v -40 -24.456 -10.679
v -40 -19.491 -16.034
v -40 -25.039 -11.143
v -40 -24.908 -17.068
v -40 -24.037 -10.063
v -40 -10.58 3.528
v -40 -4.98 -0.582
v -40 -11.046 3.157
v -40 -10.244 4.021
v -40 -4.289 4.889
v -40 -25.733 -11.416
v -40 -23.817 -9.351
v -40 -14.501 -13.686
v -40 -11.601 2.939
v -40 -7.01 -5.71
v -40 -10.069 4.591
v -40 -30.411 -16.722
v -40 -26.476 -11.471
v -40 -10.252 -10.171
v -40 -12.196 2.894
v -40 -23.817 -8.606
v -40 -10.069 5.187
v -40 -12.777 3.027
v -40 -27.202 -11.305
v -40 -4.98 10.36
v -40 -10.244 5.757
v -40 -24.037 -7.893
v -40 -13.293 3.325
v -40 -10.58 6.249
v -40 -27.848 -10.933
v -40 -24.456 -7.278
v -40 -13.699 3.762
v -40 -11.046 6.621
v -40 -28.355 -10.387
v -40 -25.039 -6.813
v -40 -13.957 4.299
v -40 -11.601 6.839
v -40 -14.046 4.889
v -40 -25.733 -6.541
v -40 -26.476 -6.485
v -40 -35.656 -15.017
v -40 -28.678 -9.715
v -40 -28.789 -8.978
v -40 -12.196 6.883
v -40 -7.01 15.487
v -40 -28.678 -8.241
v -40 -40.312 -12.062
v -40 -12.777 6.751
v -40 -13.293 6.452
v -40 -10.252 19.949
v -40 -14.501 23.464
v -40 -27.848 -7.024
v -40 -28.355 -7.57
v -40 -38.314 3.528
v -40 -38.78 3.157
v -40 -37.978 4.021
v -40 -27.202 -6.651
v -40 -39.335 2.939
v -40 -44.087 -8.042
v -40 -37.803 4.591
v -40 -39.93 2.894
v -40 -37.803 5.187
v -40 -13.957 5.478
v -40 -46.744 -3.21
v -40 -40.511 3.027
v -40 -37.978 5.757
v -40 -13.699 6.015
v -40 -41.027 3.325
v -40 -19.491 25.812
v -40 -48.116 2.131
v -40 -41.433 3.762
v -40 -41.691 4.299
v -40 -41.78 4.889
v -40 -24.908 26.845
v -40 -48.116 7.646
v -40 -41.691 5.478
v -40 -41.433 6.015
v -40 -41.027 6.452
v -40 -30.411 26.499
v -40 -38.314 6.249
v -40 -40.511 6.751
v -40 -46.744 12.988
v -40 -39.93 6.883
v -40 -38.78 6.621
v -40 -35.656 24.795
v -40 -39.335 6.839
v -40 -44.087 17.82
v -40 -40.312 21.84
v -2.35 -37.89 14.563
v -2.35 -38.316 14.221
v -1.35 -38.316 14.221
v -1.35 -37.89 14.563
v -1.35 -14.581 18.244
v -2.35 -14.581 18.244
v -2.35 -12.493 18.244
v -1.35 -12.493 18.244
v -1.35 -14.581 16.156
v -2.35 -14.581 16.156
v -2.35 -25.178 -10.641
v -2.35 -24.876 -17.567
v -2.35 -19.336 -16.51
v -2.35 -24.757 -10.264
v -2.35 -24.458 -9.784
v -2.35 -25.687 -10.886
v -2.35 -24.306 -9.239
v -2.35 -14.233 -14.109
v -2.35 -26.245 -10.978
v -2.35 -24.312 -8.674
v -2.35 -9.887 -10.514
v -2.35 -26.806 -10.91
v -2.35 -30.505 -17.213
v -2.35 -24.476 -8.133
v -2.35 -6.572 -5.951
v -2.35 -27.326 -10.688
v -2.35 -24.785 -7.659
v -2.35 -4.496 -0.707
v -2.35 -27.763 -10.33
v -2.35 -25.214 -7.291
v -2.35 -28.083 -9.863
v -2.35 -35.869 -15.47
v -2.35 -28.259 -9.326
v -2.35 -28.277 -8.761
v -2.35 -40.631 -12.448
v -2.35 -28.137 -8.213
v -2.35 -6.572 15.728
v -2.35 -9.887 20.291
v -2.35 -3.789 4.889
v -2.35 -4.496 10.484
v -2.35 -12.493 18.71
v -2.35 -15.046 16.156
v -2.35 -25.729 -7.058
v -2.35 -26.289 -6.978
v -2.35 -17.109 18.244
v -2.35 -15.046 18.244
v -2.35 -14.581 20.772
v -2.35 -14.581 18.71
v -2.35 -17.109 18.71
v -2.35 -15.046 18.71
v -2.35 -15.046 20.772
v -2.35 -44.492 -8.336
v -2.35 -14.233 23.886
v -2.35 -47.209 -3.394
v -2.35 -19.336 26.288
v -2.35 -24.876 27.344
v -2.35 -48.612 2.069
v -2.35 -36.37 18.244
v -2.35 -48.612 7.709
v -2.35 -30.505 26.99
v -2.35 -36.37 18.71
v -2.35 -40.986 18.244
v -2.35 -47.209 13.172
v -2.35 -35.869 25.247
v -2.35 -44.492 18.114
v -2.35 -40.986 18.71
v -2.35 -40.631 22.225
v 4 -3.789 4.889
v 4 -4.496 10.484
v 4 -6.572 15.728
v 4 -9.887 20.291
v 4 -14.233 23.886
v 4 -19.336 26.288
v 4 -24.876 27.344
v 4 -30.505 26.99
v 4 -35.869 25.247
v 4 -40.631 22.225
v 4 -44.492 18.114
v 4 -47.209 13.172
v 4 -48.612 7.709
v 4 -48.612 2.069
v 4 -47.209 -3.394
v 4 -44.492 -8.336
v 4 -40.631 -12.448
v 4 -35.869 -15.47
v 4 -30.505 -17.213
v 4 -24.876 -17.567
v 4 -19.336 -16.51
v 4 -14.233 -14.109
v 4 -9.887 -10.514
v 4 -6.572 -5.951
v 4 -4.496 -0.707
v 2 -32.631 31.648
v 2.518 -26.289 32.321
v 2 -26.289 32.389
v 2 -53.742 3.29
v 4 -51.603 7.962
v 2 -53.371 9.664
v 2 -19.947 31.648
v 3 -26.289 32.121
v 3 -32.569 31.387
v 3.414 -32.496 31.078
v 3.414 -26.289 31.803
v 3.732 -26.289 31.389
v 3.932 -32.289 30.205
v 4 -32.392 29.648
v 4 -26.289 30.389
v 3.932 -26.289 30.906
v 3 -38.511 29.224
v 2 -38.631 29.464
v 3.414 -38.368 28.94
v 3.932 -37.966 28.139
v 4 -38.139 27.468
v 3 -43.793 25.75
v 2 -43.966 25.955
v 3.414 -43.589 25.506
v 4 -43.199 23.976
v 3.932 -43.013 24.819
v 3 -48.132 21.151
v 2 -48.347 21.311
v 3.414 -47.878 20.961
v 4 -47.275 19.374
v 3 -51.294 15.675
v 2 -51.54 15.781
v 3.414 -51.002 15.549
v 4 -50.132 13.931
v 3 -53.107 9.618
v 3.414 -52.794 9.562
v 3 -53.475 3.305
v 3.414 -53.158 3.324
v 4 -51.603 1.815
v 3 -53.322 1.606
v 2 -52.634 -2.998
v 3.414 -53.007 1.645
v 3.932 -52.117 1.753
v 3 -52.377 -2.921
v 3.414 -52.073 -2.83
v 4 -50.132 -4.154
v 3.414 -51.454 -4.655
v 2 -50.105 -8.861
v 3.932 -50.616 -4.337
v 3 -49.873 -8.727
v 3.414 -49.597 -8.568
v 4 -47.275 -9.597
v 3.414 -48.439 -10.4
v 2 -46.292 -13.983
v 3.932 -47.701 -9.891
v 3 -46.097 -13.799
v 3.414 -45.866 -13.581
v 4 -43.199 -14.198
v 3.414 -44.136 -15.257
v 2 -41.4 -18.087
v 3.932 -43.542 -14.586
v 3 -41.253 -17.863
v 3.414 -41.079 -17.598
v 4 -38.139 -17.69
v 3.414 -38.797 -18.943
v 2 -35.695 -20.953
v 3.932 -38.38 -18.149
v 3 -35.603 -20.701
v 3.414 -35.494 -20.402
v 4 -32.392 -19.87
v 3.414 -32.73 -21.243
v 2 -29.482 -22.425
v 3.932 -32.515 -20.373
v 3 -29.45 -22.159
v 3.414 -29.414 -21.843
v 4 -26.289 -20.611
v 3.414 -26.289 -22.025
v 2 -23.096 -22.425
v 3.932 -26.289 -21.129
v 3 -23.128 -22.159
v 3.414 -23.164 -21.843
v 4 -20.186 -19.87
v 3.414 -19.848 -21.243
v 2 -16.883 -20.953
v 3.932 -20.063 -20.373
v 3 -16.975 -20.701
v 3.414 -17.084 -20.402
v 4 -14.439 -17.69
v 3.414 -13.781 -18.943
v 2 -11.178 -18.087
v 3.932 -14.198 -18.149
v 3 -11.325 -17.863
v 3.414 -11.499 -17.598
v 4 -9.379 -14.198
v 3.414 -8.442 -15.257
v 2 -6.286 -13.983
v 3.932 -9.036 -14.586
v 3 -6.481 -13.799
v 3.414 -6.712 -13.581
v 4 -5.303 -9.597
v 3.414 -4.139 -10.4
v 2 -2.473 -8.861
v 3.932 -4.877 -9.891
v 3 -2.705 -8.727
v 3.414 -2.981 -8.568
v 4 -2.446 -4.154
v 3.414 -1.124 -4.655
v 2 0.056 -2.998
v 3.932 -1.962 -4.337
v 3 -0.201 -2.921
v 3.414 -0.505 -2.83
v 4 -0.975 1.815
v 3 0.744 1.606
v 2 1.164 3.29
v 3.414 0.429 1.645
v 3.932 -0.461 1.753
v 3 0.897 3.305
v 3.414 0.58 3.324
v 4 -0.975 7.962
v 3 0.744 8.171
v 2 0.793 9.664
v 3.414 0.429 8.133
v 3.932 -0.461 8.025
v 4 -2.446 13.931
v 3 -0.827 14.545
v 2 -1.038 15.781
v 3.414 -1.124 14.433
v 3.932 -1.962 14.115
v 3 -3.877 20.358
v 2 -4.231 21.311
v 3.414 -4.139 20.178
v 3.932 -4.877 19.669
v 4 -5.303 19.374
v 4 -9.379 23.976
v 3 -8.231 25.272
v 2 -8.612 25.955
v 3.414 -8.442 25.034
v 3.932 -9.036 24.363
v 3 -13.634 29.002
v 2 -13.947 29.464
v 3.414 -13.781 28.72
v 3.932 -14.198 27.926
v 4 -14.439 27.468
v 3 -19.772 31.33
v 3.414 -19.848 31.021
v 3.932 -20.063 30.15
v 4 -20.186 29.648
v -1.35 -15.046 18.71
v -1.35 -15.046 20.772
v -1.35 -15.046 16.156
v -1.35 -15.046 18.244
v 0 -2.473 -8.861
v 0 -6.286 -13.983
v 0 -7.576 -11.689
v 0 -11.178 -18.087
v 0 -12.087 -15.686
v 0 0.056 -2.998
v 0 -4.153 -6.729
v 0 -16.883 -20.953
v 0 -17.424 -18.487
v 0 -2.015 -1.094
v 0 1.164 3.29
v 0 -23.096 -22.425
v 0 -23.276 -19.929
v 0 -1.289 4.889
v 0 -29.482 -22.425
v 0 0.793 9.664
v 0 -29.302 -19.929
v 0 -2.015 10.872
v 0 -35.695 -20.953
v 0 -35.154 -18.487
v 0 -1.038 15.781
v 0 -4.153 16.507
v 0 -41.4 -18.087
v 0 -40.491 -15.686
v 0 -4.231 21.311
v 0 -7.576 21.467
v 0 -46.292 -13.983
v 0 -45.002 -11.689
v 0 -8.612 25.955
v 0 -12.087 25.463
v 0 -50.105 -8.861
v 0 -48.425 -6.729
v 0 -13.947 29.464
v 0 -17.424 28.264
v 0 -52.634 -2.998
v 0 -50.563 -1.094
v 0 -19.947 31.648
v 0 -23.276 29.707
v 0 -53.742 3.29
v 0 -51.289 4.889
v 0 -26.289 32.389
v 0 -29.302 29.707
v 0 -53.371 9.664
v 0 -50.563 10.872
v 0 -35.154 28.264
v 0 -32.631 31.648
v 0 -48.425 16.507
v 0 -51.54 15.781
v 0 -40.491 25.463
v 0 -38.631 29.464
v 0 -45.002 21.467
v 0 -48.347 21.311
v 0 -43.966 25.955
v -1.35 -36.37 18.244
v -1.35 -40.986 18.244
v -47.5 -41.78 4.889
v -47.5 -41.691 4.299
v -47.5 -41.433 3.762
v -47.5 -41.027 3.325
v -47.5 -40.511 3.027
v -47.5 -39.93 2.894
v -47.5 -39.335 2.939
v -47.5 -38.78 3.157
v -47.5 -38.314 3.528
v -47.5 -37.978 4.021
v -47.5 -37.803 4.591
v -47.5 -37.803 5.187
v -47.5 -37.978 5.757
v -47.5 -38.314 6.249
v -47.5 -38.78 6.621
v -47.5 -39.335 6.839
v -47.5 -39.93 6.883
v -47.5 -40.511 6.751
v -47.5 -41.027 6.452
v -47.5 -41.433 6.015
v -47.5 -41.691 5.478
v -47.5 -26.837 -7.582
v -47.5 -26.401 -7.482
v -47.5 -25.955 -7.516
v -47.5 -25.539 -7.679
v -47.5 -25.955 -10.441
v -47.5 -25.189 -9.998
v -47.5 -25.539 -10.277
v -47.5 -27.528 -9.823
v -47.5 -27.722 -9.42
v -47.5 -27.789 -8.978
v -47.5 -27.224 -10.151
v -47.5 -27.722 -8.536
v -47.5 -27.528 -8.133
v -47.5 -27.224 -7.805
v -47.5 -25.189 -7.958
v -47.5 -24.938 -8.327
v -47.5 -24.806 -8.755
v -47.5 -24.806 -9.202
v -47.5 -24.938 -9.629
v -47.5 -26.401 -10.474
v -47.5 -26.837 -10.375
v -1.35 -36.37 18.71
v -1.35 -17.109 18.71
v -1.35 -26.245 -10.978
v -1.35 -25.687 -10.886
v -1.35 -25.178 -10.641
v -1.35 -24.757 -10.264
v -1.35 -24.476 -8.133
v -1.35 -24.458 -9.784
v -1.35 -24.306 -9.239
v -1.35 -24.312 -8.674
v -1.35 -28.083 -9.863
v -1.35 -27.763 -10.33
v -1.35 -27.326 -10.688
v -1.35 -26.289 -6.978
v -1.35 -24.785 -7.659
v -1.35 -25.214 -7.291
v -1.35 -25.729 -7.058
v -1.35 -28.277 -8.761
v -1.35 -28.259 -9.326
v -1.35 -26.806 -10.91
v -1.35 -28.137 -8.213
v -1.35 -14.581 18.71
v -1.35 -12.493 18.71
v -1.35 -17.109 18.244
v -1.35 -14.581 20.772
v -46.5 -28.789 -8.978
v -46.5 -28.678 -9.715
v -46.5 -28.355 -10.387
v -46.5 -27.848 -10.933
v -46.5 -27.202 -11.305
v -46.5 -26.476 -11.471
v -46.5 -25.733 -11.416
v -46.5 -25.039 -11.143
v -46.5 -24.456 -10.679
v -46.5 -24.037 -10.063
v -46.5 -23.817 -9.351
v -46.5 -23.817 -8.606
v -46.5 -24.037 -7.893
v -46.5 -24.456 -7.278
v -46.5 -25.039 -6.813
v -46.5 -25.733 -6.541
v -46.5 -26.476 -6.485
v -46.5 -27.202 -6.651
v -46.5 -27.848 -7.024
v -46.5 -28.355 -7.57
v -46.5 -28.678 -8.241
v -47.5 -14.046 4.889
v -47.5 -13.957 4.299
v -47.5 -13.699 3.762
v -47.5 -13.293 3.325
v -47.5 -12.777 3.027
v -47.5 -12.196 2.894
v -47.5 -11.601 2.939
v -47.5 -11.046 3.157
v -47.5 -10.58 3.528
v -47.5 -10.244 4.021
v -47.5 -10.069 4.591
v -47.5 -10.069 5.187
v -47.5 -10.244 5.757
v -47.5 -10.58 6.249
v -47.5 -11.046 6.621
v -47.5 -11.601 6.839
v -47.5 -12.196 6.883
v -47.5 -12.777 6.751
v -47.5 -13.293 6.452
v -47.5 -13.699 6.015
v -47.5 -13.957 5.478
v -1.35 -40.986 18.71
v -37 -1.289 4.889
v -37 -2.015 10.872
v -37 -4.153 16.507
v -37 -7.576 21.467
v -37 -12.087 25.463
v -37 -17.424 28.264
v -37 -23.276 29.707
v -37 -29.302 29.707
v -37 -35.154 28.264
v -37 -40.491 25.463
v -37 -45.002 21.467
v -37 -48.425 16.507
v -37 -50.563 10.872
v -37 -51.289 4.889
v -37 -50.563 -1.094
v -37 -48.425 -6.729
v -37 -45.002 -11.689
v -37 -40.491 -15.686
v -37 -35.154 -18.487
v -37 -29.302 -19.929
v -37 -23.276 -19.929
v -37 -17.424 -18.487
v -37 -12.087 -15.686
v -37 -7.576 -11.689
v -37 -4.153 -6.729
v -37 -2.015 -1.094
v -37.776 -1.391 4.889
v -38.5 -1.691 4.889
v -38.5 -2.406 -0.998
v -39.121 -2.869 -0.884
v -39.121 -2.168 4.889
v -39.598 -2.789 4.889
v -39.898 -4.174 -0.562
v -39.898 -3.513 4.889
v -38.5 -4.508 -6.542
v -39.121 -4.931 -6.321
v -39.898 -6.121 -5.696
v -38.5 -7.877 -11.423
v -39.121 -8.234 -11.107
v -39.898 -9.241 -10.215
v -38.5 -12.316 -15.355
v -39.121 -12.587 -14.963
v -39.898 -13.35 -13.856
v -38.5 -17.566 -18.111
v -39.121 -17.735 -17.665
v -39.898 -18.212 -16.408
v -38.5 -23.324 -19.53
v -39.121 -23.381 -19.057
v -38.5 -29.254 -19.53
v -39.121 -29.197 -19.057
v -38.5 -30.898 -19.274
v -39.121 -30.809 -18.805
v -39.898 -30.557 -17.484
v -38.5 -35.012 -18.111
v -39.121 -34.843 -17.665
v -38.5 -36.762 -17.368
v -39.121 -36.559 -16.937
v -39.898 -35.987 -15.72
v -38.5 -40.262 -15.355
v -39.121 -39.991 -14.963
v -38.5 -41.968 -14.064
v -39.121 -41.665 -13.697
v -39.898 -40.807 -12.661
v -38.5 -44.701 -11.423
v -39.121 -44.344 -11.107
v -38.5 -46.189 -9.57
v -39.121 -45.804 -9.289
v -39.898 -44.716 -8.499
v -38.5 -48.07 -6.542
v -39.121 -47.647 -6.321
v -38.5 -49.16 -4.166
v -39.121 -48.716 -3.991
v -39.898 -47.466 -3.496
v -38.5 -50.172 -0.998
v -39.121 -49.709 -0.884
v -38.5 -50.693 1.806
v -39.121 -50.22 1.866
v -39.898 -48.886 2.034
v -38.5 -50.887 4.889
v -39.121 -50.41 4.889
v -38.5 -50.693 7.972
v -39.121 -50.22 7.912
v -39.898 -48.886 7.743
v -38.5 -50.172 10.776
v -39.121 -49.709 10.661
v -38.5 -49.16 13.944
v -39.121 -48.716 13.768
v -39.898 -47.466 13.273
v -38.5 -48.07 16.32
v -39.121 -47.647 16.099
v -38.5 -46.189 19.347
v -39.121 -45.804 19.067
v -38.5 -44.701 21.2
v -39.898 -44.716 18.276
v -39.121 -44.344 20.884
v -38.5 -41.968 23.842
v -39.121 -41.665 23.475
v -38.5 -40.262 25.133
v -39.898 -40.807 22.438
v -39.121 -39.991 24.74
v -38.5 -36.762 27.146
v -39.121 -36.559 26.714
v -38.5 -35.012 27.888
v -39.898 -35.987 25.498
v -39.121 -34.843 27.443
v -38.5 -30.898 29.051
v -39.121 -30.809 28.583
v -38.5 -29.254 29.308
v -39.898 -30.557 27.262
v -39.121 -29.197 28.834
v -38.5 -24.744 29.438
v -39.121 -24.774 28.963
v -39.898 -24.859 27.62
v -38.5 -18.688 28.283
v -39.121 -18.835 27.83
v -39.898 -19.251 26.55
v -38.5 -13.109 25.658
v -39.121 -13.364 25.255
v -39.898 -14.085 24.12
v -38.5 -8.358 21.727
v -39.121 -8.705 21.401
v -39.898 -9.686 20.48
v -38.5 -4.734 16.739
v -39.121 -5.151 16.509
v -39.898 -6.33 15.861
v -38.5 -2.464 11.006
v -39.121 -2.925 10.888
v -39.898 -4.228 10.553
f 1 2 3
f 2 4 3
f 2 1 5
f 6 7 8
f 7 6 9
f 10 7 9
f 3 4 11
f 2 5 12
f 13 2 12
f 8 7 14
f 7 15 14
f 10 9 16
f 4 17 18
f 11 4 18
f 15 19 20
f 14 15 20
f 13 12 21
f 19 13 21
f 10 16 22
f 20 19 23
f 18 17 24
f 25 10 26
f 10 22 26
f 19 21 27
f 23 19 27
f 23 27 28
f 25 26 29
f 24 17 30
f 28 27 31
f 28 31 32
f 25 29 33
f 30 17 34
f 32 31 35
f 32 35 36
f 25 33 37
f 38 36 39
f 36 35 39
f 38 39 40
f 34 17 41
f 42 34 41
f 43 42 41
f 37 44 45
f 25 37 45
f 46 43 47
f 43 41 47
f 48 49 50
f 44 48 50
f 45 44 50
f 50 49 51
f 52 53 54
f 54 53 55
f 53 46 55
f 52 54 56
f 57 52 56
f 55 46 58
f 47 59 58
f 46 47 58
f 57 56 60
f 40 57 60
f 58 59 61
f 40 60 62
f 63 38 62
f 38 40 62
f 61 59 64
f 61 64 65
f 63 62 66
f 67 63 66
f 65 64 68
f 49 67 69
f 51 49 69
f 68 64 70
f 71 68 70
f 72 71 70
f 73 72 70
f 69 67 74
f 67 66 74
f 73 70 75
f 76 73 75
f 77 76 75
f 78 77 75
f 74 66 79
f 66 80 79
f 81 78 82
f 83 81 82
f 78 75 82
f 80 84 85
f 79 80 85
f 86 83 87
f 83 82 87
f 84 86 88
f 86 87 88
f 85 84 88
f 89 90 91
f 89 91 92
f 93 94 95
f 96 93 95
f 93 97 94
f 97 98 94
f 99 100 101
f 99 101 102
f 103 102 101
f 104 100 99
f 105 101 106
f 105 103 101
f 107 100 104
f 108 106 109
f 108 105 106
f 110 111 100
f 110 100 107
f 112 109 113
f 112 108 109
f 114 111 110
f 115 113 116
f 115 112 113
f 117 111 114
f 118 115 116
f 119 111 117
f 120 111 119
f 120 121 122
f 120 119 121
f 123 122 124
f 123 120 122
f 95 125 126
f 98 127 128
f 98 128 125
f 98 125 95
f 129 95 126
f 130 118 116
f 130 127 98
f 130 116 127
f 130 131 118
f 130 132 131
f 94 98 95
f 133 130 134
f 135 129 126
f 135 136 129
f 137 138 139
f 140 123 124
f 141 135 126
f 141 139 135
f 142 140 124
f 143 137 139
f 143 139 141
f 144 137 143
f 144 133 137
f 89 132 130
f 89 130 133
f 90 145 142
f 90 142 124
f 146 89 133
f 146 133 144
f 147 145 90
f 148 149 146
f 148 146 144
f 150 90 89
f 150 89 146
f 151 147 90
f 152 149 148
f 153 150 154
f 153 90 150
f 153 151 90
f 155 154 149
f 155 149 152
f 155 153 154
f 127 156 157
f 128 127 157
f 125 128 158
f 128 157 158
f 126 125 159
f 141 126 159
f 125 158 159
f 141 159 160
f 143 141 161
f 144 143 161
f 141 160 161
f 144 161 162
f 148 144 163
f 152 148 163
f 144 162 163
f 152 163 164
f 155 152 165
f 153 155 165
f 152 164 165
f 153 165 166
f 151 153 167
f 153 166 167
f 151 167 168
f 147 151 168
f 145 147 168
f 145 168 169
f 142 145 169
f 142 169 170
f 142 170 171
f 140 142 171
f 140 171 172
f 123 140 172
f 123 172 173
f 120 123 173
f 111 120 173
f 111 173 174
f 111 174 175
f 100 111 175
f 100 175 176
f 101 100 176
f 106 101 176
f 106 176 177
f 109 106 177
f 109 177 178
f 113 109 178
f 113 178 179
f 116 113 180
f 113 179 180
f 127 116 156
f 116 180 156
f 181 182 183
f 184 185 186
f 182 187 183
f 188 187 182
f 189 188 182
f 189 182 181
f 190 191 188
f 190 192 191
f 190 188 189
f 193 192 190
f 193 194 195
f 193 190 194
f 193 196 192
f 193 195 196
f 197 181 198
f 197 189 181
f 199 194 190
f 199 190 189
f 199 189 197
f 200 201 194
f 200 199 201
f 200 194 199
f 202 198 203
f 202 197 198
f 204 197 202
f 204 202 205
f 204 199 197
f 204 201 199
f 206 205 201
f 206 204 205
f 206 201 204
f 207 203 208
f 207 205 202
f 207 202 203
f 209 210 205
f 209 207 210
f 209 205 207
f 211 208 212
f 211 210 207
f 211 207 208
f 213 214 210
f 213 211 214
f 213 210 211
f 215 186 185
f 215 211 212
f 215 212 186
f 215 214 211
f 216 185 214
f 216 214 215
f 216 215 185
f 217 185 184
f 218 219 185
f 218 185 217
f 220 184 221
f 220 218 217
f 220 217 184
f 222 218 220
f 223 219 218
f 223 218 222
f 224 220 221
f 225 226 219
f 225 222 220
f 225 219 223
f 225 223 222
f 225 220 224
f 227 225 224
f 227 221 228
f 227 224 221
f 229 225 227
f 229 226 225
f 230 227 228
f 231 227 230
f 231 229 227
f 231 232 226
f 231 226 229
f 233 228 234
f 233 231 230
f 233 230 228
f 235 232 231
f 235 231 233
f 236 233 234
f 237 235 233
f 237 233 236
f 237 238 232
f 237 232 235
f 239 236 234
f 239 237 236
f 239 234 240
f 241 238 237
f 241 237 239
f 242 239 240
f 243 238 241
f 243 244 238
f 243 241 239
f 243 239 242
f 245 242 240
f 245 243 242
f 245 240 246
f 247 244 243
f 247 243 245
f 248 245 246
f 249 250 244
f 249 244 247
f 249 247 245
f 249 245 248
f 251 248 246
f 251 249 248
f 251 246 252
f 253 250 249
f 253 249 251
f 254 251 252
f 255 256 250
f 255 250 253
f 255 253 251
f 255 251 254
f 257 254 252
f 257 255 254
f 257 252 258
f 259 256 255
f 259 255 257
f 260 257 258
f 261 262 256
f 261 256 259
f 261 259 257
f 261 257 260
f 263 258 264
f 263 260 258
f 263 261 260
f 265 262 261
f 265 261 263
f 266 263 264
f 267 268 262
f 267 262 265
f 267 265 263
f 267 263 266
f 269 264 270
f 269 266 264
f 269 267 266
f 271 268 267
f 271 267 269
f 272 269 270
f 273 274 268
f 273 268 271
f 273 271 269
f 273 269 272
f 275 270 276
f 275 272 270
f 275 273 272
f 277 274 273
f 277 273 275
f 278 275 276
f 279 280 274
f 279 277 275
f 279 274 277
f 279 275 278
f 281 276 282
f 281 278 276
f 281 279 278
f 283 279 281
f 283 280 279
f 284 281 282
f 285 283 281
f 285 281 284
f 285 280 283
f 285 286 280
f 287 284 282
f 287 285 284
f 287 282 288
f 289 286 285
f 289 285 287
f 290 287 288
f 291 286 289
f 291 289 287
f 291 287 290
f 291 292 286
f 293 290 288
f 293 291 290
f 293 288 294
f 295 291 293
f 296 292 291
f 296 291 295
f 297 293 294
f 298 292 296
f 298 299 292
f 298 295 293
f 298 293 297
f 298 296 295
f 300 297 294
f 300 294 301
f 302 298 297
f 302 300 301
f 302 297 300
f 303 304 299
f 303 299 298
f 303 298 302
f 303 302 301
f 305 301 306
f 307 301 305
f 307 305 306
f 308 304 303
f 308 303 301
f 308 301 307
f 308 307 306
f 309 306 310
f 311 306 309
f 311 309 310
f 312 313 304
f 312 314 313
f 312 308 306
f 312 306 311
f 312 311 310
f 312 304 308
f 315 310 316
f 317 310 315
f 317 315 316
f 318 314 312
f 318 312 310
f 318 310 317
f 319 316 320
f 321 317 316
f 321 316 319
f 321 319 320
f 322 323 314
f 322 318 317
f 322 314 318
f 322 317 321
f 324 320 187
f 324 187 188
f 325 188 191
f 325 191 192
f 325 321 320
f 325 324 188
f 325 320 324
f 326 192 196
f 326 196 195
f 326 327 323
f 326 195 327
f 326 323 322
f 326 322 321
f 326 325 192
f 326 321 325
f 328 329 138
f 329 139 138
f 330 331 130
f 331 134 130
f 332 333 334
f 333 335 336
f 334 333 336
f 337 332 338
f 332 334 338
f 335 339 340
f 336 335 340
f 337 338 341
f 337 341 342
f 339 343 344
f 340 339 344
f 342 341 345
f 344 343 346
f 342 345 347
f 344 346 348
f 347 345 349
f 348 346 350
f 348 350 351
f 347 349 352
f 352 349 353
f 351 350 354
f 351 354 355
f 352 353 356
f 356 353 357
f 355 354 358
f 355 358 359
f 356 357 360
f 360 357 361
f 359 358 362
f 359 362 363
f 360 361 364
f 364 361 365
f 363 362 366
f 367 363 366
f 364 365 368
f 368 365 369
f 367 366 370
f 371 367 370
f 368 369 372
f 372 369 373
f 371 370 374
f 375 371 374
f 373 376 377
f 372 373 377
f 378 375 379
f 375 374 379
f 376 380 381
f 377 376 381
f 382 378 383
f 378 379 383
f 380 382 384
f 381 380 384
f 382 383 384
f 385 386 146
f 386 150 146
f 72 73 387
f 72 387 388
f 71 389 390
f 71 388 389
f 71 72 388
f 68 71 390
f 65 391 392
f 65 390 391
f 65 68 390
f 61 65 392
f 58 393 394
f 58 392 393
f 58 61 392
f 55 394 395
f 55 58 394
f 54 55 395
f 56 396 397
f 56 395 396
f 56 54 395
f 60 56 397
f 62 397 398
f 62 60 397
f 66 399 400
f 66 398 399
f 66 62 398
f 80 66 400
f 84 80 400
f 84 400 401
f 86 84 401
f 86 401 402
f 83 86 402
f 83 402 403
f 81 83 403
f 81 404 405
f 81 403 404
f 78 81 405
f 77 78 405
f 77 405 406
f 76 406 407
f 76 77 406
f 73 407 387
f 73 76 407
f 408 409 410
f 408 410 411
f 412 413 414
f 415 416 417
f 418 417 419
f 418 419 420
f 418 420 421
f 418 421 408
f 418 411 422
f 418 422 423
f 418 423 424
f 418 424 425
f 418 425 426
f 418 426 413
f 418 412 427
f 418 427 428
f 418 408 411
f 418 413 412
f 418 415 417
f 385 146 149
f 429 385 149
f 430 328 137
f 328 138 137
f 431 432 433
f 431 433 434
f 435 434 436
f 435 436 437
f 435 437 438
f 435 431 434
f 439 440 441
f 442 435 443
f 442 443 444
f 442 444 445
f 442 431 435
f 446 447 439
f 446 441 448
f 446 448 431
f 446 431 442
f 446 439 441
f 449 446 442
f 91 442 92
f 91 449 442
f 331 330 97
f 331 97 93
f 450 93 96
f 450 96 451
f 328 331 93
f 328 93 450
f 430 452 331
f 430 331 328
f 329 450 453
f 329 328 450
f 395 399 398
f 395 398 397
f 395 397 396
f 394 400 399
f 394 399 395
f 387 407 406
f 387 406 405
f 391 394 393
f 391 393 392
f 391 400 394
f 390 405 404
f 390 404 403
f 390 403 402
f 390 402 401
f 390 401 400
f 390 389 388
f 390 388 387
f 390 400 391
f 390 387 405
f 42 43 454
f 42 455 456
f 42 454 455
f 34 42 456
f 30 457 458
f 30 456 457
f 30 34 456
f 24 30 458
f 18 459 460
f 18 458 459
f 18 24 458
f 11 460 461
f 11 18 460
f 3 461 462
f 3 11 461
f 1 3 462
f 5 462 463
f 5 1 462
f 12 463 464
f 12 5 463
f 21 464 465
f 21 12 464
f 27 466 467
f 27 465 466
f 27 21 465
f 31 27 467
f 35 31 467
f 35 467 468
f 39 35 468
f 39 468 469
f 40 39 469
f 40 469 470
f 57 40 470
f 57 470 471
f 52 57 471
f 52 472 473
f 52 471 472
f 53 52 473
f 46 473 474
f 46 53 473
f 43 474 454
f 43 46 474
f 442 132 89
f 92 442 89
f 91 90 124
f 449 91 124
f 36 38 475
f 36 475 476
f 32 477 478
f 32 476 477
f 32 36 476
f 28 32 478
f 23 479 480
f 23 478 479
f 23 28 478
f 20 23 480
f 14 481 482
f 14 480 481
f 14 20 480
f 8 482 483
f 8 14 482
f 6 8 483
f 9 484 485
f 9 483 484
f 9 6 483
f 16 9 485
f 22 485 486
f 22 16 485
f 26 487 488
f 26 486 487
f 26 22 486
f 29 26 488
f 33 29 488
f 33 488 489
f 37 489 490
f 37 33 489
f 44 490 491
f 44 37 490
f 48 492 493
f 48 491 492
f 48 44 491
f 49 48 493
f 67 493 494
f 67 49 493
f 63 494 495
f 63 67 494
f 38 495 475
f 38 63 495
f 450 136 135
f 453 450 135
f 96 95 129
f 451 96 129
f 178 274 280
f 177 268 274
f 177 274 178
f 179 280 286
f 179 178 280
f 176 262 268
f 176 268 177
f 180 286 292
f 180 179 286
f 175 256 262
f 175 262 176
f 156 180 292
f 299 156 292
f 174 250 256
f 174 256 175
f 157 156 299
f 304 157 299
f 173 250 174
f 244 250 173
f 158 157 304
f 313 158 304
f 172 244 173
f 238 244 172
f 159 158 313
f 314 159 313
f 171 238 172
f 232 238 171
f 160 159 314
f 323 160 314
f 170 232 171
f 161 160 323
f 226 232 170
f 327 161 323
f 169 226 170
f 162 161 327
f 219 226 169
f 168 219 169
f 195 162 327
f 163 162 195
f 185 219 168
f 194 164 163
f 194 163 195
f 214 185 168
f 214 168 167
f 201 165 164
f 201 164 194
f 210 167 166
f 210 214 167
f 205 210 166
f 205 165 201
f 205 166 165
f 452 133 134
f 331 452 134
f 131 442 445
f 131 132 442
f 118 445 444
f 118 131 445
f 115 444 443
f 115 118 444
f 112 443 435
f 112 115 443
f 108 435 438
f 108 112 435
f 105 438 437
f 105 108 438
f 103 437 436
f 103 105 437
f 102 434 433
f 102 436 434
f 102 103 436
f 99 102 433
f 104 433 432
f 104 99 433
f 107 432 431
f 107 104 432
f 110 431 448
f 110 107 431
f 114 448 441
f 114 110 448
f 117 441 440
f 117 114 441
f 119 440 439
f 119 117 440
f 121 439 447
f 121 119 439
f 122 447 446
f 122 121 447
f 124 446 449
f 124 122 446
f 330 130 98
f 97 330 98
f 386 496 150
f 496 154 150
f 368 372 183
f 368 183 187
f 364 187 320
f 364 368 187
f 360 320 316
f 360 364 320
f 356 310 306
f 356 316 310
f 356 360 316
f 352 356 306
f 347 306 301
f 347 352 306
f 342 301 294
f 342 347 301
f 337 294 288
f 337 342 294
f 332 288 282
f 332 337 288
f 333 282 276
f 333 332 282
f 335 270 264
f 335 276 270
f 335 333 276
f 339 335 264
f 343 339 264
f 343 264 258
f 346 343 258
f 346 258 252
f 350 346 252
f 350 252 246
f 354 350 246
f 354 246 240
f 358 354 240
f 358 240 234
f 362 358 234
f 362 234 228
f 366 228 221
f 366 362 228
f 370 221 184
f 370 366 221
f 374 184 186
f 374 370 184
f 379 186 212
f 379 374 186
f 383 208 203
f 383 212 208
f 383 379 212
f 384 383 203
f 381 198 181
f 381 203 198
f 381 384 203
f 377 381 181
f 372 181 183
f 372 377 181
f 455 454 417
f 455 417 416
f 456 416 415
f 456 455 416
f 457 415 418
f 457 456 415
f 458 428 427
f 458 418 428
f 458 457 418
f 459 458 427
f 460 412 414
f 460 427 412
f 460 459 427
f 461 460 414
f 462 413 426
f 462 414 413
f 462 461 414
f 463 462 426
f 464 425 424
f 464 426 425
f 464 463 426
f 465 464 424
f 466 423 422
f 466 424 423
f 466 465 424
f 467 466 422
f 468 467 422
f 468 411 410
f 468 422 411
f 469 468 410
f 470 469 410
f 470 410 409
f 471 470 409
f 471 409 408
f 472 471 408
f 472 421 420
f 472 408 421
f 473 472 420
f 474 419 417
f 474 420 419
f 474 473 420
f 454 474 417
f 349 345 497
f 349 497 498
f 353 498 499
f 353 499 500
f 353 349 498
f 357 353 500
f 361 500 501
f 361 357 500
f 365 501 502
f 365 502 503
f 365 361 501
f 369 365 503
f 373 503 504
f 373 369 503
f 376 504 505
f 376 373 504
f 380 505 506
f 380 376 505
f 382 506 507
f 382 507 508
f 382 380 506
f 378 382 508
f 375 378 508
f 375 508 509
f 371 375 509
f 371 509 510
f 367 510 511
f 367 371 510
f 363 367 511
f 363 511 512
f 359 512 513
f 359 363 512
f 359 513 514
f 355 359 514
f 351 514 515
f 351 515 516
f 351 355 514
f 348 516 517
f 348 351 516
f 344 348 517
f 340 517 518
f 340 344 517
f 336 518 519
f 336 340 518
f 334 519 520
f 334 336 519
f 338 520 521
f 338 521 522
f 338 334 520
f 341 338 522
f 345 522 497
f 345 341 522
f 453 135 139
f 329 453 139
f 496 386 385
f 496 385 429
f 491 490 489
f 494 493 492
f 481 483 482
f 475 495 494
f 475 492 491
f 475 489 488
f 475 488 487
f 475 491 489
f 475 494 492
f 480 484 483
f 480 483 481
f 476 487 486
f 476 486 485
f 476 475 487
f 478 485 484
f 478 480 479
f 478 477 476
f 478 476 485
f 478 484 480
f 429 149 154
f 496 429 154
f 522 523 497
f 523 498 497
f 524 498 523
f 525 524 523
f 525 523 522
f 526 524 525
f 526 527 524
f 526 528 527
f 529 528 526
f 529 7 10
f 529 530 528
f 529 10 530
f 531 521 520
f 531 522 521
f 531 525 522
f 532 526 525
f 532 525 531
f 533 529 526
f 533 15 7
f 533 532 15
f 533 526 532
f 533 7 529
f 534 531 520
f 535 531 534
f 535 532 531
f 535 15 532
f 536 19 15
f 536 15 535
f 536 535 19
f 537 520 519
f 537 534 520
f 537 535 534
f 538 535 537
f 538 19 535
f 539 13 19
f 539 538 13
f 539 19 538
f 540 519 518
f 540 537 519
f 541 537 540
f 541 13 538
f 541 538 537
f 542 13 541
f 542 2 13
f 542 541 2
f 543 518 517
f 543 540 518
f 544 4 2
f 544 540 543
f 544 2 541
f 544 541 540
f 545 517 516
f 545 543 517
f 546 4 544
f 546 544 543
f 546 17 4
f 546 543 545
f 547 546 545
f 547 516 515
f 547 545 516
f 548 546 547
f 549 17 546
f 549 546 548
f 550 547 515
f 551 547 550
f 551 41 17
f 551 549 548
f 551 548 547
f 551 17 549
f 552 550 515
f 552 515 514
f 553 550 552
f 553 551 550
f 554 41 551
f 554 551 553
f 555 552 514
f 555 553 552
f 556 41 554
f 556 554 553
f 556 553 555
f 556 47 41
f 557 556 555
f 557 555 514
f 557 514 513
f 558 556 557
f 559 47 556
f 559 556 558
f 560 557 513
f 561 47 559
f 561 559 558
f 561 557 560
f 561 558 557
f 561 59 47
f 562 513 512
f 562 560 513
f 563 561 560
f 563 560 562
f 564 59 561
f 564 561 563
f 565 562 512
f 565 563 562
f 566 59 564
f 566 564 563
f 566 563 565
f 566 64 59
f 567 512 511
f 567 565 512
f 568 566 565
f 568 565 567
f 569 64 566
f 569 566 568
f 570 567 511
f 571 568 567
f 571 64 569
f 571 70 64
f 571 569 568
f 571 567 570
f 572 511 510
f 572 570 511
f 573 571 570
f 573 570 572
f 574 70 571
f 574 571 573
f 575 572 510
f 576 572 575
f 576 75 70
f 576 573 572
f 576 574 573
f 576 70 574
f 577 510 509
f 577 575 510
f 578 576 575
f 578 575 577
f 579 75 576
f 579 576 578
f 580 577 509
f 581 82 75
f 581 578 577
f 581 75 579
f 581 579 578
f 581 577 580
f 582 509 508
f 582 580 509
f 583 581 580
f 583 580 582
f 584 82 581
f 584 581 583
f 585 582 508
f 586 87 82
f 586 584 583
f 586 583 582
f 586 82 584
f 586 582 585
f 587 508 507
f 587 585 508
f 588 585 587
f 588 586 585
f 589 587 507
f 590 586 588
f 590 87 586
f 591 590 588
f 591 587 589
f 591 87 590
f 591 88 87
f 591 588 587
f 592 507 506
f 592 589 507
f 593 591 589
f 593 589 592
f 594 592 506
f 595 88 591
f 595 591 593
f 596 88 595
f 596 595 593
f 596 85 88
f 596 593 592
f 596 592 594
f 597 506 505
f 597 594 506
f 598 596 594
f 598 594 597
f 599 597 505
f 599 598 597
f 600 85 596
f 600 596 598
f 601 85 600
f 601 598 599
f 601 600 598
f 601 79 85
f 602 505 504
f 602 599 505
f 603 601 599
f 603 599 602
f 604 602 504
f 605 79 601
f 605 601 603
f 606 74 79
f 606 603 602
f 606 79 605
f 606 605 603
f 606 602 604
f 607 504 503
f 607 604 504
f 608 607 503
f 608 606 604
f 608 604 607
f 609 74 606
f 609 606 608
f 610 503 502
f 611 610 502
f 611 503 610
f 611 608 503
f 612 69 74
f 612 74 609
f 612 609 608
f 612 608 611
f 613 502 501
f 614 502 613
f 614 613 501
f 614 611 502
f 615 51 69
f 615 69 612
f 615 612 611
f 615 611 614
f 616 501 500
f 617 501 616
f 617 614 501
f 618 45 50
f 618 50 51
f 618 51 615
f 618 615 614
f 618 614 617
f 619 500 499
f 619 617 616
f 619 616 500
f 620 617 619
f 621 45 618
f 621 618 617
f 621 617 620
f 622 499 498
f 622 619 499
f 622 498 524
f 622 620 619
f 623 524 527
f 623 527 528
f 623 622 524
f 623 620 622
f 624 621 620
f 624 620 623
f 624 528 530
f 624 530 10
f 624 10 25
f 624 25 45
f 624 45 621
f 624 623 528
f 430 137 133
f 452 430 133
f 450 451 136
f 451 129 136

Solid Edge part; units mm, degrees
sketch "Sketch1" plane through (0, 0, 0) normal (1, 0, 0) x (0, 1, 0)
  circle A0 centre (-26.289, 4.8888) radius 25
  dimension "D1" = 50
extrude "Protrusion1" add sketch "Sketch1" against normal blind 40
sketch "Sketch2" plane through (0, -26.289, 4.8888) normal (1, 0, 0) x (0, 0, 1)
  circle A0 centre (0, 0) radius 27.5
extrude "ExtrudedProtrusion_2" add sketch "Sketch2" along normal blind 4
fillet "Round_1" radius 2 1 edges at (4, -26.289, -22.6112)
fillet "Round_2" radius 3 1 edges at (-40, -51.289, 4.8888)
sketch "Sketch3" plane through (-40, -26.289, 4.8888) normal (-1, 0, 0) x (0, -1, 0)
  circle A0 centre (-14.2428, 0) radius 2
  circle A1 centre (13.4912, 0) radius 2
  circle A2 centre (0, -13.867) radius 2.5
  dimension "D1" = 5
  dimension "D2" = 4
extrude "ExtrudedProtrusion_3" add sketch "Sketch3" along normal blind 7.5
chamfer "Chamfer_1" distance 1 angle 45 1 edges at (-47.5, -23.789, -8.9782)
sketch "Sketch4" plane through (4, -26.289, 4.8888) normal (1, 0, 0) x (0, 1, 0)
  circle A0 centre (0, 0) radius 22.5
extrude "ExtrudedCutout_1" cut sketch "Sketch4" against normal blind 6.35
sketch "Sketch5" plane through (-2.35, -26.289, 4.8888) normal (1, 0, 0) x (0, 1, 0)
  line L0 (0, -11.867) -> (-11.6013, 9.6746)
  line L1 (-12.0271, 9.3319) -> (-11.6013, 9.6746)
  line L2 (-12.0271, 9.3319) -> (-1.8479, -13.1021)
  arc A0 (-1.8479, -13.1021) -> (0, -11.867) centre (0, -13.867) ccw
  line L3 (-14.6973, 13.3557) -> (-10.0815, 13.3557)
  line L4 (-10.0815, 13.3557) -> (-10.0815, 13.8208)
  line L5 (-10.0815, 13.8208) -> (-14.6973, 13.8208)
  line L6 (-14.6973, 13.8208) -> (-14.6973, 13.3557)
  line L7 (11.7077, 13.3557) -> (13.7958, 13.3557)
  line L8 (13.7958, 13.3557) -> (13.7958, 13.8208)
  line L9 (13.7958, 13.8208) -> (11.7077, 13.8208)
  line L10 (11.7077, 13.8208) -> (11.7077, 15.8834)
  line L11 (11.7077, 15.8834) -> (11.2426, 15.8834)
  line L12 (11.2426, 15.8834) -> (11.2426, 13.8208)
  line L13 (11.2426, 13.8208) -> (9.18, 13.8208)
  line L14 (9.18, 13.8208) -> (9.18, 13.3557)
  line L15 (9.18, 13.3557) -> (11.2426, 13.3557)
  line L16 (11.2426, 13.3557) -> (11.2426, 11.2676)
  line L17 (11.2426, 11.2676) -> (11.7077, 11.2676)
  line L18 (11.7077, 11.2676) -> (11.7077, 13.3557)
  line L19 (9.18, 13.3557) -> (13.7958, 13.3557)
  line L20 (13.7958, 13.3557) -> (13.7958, 13.8208)
  line L21 (13.7958, 13.8208) -> (9.18, 13.8208)
  line L22 (9.18, 13.8208) -> (9.18, 13.3557)
  line L23 (11.7077, 11.2676) -> (11.7077, 15.8834)
  line L24 (11.7077, 15.8834) -> (11.2426, 15.8834)
  line L25 (11.2426, 15.8834) -> (11.2426, 11.2676)
  line L26 (11.2426, 11.2676) -> (11.7077, 11.2676)
extrude "ExtrudedProtrusion_4" add sketch "Sketch5" along normal blind 1
